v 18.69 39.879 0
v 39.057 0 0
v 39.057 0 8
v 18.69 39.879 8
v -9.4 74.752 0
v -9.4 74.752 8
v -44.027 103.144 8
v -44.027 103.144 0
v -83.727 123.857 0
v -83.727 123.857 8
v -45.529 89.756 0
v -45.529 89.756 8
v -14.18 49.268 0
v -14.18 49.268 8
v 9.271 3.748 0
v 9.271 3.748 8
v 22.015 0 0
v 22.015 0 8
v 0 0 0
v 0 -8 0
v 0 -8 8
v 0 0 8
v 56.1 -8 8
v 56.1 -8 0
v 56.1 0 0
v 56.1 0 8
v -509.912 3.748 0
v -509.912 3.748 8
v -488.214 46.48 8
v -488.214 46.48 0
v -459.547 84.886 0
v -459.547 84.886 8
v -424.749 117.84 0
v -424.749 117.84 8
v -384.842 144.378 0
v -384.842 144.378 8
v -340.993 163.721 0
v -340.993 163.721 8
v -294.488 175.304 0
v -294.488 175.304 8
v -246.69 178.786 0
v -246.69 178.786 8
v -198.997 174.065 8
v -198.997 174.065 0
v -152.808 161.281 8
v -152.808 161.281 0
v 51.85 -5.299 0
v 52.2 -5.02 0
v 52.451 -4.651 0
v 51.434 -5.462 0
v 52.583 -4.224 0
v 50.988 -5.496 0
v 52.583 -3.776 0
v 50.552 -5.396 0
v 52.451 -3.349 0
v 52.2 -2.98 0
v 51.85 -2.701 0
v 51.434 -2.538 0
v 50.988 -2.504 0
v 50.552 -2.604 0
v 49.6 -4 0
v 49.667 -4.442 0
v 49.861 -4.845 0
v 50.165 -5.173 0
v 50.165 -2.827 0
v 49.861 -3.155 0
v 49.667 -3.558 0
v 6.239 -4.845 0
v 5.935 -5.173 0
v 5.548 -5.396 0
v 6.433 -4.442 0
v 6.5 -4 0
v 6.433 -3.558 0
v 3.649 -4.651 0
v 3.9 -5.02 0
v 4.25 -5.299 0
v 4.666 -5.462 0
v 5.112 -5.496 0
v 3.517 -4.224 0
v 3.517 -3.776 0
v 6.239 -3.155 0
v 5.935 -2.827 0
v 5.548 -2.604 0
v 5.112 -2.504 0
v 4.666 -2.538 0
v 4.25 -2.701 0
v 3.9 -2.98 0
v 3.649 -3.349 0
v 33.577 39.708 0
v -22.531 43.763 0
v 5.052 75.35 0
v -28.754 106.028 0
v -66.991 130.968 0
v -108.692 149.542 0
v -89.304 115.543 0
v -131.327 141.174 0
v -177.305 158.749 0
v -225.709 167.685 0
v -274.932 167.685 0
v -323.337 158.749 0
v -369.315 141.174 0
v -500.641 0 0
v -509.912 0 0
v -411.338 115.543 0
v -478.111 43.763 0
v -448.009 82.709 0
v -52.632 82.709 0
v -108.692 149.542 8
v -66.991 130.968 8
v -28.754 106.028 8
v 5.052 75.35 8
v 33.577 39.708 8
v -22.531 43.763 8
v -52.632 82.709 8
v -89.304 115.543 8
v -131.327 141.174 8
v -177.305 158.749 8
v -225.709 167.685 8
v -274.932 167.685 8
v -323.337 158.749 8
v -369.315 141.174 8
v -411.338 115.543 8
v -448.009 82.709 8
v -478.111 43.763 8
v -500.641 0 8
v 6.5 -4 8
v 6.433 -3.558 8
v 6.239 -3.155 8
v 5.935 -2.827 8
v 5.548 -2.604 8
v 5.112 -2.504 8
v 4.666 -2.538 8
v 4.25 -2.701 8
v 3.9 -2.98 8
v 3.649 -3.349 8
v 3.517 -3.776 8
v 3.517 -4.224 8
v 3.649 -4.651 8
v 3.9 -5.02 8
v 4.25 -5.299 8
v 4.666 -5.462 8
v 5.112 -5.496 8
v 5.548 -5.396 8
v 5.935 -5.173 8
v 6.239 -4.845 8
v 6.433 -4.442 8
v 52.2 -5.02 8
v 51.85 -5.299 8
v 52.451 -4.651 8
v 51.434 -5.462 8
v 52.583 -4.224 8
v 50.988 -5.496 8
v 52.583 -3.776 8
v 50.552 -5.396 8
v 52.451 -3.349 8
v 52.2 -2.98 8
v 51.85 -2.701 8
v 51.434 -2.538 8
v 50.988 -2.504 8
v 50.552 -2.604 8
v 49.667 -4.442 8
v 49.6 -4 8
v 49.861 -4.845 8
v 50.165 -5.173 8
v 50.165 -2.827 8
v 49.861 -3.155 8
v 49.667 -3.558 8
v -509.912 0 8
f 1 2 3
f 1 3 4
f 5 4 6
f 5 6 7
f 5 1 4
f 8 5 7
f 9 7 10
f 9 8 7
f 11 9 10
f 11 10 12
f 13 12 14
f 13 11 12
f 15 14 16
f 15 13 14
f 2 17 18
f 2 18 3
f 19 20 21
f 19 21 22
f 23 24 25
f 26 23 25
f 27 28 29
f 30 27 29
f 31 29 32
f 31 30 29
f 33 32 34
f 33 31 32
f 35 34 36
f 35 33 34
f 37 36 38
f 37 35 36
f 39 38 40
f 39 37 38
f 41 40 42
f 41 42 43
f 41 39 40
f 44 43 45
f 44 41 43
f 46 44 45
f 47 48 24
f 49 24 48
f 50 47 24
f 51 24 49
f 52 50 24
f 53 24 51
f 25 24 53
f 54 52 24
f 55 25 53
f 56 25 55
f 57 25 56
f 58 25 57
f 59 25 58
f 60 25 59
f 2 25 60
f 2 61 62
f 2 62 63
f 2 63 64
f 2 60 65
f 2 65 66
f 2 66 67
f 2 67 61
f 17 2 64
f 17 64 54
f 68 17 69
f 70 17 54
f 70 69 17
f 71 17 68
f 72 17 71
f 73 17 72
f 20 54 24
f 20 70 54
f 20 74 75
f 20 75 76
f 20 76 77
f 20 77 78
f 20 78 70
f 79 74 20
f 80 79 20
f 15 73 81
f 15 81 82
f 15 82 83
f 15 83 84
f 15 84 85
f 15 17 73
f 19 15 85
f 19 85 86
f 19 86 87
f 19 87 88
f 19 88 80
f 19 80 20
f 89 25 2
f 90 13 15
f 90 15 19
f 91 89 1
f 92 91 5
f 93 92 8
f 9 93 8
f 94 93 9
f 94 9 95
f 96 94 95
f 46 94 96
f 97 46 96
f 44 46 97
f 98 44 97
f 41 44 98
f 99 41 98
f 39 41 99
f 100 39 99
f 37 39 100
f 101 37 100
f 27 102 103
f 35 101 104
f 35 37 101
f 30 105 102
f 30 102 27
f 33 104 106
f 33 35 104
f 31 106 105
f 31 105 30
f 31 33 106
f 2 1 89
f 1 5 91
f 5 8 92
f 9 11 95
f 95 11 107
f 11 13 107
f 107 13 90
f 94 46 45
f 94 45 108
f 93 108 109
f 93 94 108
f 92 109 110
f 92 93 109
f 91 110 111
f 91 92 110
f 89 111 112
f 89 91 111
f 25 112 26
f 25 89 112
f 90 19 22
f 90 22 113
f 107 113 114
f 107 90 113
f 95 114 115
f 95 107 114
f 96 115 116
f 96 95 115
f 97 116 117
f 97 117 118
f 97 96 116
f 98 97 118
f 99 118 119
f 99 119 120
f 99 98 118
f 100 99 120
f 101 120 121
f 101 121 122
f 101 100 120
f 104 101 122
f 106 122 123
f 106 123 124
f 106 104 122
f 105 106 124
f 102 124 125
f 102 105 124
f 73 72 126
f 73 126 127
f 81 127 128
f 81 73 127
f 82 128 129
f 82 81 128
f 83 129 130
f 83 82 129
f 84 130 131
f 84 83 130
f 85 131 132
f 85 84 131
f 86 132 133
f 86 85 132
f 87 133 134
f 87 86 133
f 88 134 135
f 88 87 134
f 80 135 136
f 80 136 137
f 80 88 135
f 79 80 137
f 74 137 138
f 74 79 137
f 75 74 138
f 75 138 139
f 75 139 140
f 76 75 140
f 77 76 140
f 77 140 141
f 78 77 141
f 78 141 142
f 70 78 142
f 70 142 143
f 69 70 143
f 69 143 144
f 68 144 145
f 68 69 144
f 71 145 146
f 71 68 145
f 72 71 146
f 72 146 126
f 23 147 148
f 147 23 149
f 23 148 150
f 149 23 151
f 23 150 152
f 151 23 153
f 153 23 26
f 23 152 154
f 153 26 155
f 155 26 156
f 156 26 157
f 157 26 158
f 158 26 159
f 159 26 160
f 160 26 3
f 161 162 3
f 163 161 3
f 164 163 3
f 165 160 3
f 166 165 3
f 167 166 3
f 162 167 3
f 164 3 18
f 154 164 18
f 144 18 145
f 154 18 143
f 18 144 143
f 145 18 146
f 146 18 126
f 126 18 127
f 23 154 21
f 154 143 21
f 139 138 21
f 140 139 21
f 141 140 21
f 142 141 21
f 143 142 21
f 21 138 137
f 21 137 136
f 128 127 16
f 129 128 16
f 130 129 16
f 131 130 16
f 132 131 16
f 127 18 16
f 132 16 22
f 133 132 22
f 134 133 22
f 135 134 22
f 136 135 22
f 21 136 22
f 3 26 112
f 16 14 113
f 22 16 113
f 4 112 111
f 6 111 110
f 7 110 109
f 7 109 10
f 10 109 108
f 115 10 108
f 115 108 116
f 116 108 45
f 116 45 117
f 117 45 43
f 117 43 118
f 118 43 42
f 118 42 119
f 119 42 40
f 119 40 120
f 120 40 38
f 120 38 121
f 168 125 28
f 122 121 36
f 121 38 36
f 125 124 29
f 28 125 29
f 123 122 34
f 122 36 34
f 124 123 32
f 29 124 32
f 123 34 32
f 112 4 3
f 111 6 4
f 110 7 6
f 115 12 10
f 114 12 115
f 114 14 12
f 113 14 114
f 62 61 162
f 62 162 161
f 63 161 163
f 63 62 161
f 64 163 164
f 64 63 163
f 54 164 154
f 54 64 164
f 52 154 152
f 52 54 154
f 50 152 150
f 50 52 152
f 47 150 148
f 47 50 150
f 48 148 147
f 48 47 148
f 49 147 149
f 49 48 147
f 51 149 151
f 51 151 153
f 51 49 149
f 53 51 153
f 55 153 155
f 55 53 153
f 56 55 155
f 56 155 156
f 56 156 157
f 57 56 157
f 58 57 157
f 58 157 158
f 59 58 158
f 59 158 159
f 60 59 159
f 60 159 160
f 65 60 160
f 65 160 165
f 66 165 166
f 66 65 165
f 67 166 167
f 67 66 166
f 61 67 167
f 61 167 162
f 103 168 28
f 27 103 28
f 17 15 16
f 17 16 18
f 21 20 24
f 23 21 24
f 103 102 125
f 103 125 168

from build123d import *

# Parameters (mm, degrees)
SKETCH_1_W      = 56.1
SKETCH_1_H      = 8
SKETCH_1_R      = 1.5
EXTRUDE_1_DEPTH = 8
EXTRUDE_5_DEPTH = 8
EXTRUDE_6_DEPTH = 8


with BuildPart() as part:
    # 草图1 → 凸台-拉伸1 (new body)
    with BuildSketch(Plane.XY):
        with Locations((28.05, -4)):
            Rectangle(SKETCH_1_W, SKETCH_1_H)
        with Locations((5, -4)):
            Circle(SKETCH_1_R, mode=Mode.SUBTRACT)
        with Locations(Location((51.1, -4, 0), (0, 0, 180))):
            Circle(SKETCH_1_R, mode=Mode.SUBTRACT)
    extrude(amount=EXTRUDE_1_DEPTH)

    # 草图3 → 凸台-拉伸5 (add)
    with BuildSketch(Plane(origin=(0, 0, 0), x_dir=(-1, 0, 0), z_dir=(0, 0, -1))):
        with BuildLine():
            Line((-9.271136129, 3.747804008), (-22.014574203, 0))
            Line((-22.014574203, 0), (0, 0))
            ThreePointArc((0, 0), (250.320675472, 168.809291774), (500.641350944, 0))
            Line((500.641350944, 0), (509.912487072, 0))
            Line((509.912487072, 0), (509.912487072, 3.747804008))
            ThreePointArc((509.912487072, 3.747804008), (250.320675472, 178.809291774), (-9.271136129, 3.747804008))
        make_face()
    extrude(amount=-EXTRUDE_5_DEPTH)

    # 草图4 → 凸台-拉伸6 (add)
    with BuildSketch(Plane(origin=(0, 0, 0), x_dir=(-1, 0, 0), z_dir=(0, 0, -1))):
        with BuildLine():
            ThreePointArc((152.808242493, 161.280862452), (28.754408722, 106.028077563), (-56.1, 0))
            Line((-56.1, 0), (-39.057287102, 0))
            ThreePointArc((-39.057287102, 0), (9.399846723, 74.751796663), (83.727278113, 123.857375428))
            ThreePointArc((83.727278113, 123.857375428), (116.948632862, 145.004129758), (152.808242493, 161.280862452))
        make_face()
    extrude(amount=-EXTRUDE_6_DEPTH)


solid = part.part
